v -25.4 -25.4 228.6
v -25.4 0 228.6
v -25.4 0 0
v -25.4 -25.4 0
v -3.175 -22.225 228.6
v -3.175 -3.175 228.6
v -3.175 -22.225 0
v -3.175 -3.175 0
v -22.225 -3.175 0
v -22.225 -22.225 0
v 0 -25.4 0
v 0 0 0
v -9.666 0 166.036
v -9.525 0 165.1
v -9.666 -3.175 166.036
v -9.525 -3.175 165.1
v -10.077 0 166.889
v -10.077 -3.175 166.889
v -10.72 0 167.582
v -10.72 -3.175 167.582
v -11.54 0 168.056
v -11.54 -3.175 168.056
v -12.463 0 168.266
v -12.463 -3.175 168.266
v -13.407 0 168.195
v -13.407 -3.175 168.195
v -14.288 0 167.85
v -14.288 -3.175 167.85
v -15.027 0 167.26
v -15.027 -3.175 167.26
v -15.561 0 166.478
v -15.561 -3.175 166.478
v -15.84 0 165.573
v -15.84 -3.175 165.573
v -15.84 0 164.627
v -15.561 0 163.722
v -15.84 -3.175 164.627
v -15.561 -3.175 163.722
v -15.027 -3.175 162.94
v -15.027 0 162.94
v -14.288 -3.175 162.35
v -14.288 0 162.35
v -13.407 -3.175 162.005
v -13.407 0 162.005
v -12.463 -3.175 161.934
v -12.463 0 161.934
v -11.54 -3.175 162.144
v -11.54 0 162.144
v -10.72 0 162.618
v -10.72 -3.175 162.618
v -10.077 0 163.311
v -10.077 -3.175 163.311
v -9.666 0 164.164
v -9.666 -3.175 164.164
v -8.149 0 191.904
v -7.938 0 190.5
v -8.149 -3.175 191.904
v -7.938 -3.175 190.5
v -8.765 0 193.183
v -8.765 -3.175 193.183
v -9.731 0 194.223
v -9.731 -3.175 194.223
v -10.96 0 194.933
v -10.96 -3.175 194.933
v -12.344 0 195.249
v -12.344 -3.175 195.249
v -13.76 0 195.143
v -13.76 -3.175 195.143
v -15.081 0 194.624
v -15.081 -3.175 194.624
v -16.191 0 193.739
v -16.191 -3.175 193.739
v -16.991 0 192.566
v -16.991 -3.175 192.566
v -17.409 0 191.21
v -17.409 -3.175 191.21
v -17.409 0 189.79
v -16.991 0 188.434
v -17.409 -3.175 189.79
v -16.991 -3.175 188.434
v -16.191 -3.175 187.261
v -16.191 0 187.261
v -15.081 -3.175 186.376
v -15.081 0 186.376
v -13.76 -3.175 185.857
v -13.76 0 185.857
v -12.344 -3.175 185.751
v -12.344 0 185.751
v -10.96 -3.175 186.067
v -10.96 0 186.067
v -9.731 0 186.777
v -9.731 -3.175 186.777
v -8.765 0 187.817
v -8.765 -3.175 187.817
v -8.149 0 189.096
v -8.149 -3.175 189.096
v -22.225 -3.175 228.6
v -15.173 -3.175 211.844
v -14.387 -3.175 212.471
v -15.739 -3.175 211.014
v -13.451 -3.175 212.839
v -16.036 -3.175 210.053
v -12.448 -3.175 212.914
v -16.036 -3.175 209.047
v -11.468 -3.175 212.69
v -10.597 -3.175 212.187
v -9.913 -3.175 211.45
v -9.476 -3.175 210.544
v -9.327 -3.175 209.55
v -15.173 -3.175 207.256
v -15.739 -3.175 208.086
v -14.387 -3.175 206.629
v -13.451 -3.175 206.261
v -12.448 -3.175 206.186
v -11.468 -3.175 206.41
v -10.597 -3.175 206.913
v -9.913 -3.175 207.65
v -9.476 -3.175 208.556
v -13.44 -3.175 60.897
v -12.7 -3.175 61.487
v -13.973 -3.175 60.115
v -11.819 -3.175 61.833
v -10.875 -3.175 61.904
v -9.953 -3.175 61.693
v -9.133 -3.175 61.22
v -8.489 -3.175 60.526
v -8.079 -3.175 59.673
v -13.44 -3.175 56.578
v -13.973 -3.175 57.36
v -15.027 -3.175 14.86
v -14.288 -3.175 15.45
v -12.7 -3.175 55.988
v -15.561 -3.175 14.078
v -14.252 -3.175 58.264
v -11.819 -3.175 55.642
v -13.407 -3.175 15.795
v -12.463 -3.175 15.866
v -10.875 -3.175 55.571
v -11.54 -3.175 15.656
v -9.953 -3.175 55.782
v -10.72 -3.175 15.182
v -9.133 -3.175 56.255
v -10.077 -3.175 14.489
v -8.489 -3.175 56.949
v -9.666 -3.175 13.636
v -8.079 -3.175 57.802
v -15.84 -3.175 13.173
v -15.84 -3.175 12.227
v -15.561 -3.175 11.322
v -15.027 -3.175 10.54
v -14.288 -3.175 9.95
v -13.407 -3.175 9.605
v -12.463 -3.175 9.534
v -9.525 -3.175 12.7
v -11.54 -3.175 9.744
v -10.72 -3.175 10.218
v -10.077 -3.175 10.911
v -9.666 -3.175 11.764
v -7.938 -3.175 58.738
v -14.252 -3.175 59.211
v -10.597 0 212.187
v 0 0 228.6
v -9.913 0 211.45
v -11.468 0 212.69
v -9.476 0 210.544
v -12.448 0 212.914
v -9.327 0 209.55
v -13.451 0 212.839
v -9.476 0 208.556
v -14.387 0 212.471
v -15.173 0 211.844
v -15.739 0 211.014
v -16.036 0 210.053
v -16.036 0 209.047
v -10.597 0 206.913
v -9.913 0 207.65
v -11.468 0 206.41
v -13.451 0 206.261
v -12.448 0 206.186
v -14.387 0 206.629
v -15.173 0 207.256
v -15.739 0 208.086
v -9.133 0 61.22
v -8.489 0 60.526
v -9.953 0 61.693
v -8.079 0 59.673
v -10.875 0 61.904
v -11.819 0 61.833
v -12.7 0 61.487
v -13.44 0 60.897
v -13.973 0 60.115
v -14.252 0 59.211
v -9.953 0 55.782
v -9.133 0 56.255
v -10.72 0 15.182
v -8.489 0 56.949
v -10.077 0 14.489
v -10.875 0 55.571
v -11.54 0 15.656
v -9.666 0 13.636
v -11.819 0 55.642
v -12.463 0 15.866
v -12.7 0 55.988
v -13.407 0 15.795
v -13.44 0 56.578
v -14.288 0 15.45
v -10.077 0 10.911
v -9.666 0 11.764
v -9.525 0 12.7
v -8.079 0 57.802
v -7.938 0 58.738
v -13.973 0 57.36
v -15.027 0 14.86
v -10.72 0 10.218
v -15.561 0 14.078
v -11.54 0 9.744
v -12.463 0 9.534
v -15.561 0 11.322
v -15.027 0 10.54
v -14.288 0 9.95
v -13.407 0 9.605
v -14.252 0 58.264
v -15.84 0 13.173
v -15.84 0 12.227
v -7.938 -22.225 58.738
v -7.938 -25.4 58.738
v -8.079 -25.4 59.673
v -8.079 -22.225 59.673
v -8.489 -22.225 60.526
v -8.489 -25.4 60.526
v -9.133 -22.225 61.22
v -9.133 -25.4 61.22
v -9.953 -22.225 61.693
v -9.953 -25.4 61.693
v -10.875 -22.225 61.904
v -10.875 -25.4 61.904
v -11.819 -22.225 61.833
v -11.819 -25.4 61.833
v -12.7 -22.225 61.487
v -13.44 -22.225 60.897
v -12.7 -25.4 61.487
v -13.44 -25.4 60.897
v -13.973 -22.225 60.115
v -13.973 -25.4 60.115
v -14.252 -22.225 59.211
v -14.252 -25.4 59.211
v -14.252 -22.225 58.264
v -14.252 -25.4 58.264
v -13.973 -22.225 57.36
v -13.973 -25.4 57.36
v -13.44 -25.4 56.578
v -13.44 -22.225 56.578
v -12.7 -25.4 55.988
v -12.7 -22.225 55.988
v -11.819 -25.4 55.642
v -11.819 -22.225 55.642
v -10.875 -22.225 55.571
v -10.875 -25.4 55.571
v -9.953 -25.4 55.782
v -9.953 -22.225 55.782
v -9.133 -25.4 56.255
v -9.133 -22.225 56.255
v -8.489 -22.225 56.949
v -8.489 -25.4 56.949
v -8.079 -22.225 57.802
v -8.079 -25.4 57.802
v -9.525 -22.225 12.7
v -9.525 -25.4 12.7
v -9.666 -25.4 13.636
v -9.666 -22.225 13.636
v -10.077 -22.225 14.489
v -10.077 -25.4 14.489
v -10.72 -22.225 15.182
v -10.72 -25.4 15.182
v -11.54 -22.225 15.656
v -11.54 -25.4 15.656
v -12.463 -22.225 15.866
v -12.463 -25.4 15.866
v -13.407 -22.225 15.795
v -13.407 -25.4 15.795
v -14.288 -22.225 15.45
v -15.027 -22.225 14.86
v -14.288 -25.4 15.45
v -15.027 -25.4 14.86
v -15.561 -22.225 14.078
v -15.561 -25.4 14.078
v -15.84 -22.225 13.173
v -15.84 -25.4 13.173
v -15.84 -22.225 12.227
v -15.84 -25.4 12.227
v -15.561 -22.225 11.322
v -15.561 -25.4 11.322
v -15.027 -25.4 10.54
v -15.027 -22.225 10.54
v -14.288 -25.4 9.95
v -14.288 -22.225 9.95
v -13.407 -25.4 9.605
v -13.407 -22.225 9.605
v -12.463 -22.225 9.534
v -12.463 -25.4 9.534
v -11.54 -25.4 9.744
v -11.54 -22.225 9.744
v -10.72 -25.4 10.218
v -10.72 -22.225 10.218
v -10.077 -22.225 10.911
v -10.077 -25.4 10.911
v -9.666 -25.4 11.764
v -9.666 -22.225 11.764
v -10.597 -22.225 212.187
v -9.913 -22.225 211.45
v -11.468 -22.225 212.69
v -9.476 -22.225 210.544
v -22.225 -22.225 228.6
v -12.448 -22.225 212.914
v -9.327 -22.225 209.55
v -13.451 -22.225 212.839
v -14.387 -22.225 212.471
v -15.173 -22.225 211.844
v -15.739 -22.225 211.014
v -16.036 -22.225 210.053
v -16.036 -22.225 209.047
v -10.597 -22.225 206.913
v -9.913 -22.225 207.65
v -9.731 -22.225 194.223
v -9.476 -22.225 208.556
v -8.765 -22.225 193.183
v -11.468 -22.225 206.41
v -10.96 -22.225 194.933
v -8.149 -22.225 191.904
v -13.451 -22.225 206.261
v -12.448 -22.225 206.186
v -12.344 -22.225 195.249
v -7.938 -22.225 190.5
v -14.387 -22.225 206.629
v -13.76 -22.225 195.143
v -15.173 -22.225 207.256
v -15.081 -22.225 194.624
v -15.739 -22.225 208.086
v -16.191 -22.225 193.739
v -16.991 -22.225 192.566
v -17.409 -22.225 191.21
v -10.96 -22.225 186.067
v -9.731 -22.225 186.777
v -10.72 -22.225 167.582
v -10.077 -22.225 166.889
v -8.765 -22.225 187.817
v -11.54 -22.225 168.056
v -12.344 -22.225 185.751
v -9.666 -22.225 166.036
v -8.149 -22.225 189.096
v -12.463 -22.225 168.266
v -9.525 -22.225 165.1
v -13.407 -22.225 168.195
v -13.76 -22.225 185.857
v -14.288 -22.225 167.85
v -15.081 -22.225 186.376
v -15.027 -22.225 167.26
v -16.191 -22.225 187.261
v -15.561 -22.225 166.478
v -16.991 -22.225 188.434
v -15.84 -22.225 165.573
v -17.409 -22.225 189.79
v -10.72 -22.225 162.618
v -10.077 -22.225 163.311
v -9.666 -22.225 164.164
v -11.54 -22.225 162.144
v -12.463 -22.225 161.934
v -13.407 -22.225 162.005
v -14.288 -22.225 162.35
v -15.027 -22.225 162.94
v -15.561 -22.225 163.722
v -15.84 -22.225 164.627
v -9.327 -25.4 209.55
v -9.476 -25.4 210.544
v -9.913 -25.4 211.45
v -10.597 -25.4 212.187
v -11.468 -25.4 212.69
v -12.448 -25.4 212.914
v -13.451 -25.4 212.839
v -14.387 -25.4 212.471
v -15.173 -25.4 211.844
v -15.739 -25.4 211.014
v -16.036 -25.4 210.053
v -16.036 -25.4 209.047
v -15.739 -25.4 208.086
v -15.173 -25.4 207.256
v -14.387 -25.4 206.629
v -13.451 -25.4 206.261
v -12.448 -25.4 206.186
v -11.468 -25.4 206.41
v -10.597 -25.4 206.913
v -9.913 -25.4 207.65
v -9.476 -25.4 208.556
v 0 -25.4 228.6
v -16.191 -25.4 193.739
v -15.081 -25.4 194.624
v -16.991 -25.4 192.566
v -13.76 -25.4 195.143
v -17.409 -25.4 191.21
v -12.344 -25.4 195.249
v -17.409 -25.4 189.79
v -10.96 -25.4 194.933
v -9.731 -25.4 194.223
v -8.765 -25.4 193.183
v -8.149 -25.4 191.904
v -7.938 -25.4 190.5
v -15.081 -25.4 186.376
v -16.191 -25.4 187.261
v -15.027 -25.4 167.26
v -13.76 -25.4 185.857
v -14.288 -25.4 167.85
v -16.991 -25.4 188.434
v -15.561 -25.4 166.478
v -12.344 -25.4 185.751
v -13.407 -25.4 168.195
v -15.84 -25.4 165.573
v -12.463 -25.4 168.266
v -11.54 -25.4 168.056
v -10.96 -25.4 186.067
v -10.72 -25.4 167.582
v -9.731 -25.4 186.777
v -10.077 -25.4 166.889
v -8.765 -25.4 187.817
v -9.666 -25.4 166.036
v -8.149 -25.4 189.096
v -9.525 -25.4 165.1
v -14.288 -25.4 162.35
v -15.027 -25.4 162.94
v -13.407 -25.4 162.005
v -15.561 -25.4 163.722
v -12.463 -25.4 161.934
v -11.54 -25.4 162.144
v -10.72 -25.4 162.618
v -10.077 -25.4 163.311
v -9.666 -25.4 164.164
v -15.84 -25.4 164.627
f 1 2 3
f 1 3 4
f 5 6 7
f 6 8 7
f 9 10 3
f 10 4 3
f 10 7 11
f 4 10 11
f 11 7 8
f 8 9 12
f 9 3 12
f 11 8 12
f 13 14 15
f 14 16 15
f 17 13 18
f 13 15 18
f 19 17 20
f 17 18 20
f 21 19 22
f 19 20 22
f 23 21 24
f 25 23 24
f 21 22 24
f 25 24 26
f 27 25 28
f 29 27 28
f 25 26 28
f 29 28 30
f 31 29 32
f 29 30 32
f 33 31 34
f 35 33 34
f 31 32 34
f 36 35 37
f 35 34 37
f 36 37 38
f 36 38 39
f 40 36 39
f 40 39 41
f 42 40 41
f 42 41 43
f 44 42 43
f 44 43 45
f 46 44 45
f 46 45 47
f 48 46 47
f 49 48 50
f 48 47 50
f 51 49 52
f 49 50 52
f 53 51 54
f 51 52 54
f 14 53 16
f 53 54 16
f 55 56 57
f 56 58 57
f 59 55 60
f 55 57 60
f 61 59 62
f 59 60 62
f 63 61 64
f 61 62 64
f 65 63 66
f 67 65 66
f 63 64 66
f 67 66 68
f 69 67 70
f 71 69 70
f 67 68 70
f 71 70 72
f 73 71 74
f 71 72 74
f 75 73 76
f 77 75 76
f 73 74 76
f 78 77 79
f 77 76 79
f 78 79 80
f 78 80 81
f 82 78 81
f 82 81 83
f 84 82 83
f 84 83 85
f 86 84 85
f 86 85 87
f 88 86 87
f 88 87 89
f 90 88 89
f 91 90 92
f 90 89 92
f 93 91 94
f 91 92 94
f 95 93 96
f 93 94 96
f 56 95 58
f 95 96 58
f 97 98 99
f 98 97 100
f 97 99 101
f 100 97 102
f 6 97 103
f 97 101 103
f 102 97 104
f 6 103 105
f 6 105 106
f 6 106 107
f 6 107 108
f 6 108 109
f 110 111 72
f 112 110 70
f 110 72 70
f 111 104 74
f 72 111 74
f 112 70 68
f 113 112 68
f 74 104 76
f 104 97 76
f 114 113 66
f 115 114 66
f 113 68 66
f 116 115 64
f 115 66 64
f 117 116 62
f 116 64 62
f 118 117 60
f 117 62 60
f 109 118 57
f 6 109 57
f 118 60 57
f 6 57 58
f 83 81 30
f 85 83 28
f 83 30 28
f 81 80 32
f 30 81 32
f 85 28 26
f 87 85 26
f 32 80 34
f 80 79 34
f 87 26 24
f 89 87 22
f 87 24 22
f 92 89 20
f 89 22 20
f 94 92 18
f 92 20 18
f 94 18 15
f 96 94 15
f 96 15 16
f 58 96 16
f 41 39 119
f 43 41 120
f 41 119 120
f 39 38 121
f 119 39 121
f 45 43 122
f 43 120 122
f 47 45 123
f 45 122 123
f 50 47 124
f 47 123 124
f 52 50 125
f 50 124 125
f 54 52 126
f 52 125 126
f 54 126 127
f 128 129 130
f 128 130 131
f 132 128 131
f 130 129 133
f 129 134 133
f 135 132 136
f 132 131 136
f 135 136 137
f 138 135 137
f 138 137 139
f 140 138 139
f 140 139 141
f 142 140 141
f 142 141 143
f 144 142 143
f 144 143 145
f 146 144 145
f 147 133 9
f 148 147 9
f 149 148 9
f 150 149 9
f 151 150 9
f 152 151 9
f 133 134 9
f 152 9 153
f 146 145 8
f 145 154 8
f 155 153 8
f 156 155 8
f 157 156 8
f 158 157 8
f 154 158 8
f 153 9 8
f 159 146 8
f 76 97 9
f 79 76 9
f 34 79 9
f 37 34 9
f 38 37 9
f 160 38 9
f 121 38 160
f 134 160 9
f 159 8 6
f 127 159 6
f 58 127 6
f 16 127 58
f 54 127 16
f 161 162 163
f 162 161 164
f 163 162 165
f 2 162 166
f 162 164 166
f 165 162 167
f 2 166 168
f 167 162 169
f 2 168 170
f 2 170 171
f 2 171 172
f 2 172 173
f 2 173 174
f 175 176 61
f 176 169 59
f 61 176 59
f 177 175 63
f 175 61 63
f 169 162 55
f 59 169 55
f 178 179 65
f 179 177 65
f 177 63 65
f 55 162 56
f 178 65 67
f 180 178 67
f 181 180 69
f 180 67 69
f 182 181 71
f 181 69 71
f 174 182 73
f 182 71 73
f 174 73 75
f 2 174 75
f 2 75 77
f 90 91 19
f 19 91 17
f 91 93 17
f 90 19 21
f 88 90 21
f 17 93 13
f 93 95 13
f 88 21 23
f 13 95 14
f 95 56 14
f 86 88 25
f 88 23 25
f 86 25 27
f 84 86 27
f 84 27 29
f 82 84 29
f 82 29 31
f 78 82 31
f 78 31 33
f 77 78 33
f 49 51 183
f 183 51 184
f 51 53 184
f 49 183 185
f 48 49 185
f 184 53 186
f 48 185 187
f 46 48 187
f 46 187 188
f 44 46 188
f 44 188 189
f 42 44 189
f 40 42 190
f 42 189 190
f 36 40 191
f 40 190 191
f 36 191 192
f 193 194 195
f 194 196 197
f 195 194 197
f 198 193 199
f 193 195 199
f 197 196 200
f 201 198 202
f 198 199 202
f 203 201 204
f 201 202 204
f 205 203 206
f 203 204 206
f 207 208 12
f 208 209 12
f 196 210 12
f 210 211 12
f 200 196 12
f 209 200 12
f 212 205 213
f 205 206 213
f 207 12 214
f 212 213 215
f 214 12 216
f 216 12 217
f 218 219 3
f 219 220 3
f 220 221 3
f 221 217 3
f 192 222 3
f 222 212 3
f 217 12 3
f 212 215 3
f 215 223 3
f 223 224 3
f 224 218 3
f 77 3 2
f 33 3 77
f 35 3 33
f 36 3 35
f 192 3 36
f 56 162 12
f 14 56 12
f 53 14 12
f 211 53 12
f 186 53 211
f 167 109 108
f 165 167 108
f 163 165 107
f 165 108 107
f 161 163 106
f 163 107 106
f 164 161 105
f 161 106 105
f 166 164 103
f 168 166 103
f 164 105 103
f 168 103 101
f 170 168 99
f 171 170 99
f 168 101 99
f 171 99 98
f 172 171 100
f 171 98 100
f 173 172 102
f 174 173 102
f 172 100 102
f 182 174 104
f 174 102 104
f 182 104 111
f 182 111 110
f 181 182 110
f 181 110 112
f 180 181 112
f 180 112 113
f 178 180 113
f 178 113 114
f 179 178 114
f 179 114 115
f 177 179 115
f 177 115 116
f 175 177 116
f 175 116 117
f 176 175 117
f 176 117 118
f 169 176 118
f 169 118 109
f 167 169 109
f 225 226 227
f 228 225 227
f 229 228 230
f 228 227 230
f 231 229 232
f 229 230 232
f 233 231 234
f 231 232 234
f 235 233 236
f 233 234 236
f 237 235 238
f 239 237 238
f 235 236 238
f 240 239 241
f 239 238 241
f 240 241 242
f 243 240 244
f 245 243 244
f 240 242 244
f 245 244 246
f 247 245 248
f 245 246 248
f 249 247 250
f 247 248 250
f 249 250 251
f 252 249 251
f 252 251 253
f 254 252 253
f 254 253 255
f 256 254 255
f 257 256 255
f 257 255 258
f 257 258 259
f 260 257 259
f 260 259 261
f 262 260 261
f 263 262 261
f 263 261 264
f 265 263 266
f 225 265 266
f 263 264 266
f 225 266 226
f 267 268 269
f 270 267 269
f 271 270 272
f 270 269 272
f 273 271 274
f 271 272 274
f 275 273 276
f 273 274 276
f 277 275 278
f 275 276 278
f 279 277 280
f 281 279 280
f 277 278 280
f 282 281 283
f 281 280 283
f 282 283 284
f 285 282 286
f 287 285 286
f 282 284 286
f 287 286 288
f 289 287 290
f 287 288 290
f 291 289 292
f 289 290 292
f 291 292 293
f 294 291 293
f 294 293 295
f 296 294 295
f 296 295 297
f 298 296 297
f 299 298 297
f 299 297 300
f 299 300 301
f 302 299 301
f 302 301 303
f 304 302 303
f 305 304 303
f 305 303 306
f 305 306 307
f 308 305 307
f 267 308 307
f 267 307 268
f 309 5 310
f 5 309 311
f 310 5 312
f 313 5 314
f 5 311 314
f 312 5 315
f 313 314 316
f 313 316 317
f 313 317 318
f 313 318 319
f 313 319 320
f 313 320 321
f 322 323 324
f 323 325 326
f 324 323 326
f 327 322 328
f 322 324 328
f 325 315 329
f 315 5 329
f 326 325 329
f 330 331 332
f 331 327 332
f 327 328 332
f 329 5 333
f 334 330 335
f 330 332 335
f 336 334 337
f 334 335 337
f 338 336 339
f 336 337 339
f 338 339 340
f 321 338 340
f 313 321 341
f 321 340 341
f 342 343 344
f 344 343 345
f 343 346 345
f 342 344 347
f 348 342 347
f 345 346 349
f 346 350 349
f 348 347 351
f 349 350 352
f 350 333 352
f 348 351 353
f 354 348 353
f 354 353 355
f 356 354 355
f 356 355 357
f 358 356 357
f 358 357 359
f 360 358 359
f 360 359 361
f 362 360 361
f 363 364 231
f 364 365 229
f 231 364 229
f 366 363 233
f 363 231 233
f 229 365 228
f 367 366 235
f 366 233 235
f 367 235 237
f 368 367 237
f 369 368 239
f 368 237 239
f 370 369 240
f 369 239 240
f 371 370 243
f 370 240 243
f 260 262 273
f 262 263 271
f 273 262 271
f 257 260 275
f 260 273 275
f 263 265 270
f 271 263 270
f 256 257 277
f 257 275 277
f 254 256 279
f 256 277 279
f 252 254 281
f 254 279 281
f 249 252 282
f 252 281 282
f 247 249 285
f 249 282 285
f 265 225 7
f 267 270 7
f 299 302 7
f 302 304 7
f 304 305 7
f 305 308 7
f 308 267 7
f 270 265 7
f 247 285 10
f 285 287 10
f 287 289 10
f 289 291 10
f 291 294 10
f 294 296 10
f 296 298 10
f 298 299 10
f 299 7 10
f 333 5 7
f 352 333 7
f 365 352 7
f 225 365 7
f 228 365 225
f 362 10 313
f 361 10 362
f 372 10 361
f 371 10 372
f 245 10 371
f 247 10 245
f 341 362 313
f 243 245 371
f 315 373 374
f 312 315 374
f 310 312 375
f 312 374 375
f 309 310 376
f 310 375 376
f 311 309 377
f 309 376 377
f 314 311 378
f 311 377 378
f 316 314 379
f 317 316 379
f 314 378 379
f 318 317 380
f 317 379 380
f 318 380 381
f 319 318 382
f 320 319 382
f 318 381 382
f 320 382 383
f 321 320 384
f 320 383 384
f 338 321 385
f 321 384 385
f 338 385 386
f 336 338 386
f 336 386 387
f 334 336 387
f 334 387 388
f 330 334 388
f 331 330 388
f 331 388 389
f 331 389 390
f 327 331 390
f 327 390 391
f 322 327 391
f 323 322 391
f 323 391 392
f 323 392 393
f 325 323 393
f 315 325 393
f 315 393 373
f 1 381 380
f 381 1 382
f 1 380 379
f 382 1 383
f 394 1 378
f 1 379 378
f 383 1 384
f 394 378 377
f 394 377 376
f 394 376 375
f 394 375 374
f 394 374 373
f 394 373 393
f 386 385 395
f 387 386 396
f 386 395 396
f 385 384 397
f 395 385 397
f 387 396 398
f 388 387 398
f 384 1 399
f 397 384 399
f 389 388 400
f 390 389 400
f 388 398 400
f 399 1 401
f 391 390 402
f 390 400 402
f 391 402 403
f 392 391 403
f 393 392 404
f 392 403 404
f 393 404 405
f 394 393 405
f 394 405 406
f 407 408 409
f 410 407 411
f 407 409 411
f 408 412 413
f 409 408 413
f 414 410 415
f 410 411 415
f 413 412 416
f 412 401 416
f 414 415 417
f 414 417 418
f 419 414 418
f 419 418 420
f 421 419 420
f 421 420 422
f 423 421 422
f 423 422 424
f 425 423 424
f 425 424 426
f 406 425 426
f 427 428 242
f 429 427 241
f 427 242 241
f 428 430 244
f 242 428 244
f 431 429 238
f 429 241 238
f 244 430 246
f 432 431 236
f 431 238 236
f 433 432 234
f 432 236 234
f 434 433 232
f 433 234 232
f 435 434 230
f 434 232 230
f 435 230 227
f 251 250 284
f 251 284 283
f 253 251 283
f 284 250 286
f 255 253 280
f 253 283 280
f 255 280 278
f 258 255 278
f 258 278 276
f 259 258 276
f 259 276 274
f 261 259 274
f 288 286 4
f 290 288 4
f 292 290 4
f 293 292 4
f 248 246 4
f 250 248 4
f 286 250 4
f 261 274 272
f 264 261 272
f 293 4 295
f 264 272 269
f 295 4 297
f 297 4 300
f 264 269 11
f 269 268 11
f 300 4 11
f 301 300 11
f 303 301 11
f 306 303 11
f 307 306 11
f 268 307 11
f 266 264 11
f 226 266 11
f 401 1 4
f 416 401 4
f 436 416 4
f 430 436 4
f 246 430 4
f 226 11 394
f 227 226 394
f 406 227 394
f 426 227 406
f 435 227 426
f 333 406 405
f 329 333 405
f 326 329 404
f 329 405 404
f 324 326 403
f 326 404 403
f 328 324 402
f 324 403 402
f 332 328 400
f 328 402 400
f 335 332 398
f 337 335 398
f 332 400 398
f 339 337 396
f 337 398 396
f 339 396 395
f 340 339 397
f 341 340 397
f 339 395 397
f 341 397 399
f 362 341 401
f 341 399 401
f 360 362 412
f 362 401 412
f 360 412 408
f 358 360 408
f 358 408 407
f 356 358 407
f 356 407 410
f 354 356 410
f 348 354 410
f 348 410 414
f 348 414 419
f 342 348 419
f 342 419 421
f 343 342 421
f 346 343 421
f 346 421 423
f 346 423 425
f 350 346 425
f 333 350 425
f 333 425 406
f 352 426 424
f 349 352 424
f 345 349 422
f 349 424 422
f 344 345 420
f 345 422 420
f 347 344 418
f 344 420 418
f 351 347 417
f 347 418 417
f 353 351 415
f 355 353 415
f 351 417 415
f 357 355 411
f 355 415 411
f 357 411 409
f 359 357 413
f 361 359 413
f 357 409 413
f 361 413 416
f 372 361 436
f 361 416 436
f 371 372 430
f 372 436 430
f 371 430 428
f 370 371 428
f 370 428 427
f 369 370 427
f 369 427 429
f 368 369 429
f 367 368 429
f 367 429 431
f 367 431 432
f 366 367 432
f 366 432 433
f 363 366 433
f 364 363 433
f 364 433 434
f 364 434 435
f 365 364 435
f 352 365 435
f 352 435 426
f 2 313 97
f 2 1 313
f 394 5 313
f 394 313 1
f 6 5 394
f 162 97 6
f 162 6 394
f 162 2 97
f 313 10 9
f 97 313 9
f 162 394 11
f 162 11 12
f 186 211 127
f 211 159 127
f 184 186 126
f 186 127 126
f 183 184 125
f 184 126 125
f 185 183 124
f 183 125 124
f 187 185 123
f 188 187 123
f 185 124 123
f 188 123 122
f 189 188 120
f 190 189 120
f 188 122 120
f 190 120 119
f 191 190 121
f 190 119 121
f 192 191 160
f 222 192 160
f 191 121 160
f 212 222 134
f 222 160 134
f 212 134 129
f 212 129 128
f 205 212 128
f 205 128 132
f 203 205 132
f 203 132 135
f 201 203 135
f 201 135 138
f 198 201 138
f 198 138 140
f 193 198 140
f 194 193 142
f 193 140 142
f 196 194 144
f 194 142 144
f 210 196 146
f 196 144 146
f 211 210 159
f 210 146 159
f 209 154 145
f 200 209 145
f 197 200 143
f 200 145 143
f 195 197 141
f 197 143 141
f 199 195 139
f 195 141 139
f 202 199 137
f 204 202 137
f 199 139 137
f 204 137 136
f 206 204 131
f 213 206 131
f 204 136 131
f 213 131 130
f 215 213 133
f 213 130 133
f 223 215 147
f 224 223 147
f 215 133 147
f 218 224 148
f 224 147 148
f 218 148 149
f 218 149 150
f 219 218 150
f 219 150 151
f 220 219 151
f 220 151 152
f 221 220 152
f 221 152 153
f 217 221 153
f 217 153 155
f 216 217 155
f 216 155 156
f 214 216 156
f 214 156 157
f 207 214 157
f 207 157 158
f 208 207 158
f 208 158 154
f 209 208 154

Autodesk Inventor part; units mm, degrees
ref_plane "YZ Plane" through (0, 0, 0) normal (1, 0, 0) x (0, 1, 0)
ref_plane "XZ Plane" through (0, 0, 0) normal (0, 1, 0) x (-1, 0, 0)
ref_plane "XY Plane" through (0, 0, 0) normal (0, 0, 1) x (1, 0, 0)
sketch "Sketch1" plane through (0, 0, 0) normal (0, 0, 1) x (1, 0, 0)
  line L0 (0, 0) -> (-25.4, 0)
  line L1 (-25.4, 0) -> (-25.4, -25.4)
  line L2 (-25.4, -25.4) -> (0, -25.4)
  line L3 (0, -25.4) -> (0, 0)
  line L4 (-3.175, -22.225) -> (-22.225, -22.225)
  line L5 (-22.225, -22.225) -> (-22.225, -3.175)
  line L6 (-22.225, -3.175) -> (-3.175, -3.175)
  line L7 (-3.175, -3.175) -> (-3.175, -22.225)
  dimension "d0" = 25.4
  dimension "d1" = 25.4
  dimension "d2" = 3.175
extrude "Extrusion1" add sketch "Sketch1" along normal blind 228.6
sketch "Sketch2" plane through (-25.4, -25.4, 0) normal (0, -1, 0) x (1, 0, 0)
  circle A0 centre (12.7, 190.5) radius 4.7625
  line L0 (0, 228.6) -> (25.4, 228.6) projected
  line L1 (0, 0) -> (0, 228.6) projected
  circle A1 centre (12.7, 12.7) radius 3.175
  circle A2 centre (14.2875, 58.7375) radius 3.175
  line L2 (0, 0) -> (25.4, 0) projected
  circle A3 centre (12.7, 209.55) radius 3.3734
  line L3 (25.4, 0) -> (25.4, 228.6) projected
  circle A4 centre (12.7, 165.1) radius 3.175
  dimension "d5" = 9.525
  dimension "d6" = 38.1
  dimension "d7" = 12.7
  dimension "d10" = 6.35
  dimension "d11" = 12.7
  dimension "d13" = 14.2875
  dimension "d14" = 12.7
  dimension "d15" = 58.7375
  dimension "d16" = 6.7469
  dimension "d17" = 12.7
  dimension "d18" = 19.05
  dimension "d19" = 6.35
  dimension "d20" = 63.5
  dimension "d21" = 12.7
extrude "Extrusion2" cut sketch "Sketch2" against normal blind 152.4 contours A0 | A1 | A2 | A3 | A4
properties part number "15102898-16-A-0205" material "Aluminum 6061"
